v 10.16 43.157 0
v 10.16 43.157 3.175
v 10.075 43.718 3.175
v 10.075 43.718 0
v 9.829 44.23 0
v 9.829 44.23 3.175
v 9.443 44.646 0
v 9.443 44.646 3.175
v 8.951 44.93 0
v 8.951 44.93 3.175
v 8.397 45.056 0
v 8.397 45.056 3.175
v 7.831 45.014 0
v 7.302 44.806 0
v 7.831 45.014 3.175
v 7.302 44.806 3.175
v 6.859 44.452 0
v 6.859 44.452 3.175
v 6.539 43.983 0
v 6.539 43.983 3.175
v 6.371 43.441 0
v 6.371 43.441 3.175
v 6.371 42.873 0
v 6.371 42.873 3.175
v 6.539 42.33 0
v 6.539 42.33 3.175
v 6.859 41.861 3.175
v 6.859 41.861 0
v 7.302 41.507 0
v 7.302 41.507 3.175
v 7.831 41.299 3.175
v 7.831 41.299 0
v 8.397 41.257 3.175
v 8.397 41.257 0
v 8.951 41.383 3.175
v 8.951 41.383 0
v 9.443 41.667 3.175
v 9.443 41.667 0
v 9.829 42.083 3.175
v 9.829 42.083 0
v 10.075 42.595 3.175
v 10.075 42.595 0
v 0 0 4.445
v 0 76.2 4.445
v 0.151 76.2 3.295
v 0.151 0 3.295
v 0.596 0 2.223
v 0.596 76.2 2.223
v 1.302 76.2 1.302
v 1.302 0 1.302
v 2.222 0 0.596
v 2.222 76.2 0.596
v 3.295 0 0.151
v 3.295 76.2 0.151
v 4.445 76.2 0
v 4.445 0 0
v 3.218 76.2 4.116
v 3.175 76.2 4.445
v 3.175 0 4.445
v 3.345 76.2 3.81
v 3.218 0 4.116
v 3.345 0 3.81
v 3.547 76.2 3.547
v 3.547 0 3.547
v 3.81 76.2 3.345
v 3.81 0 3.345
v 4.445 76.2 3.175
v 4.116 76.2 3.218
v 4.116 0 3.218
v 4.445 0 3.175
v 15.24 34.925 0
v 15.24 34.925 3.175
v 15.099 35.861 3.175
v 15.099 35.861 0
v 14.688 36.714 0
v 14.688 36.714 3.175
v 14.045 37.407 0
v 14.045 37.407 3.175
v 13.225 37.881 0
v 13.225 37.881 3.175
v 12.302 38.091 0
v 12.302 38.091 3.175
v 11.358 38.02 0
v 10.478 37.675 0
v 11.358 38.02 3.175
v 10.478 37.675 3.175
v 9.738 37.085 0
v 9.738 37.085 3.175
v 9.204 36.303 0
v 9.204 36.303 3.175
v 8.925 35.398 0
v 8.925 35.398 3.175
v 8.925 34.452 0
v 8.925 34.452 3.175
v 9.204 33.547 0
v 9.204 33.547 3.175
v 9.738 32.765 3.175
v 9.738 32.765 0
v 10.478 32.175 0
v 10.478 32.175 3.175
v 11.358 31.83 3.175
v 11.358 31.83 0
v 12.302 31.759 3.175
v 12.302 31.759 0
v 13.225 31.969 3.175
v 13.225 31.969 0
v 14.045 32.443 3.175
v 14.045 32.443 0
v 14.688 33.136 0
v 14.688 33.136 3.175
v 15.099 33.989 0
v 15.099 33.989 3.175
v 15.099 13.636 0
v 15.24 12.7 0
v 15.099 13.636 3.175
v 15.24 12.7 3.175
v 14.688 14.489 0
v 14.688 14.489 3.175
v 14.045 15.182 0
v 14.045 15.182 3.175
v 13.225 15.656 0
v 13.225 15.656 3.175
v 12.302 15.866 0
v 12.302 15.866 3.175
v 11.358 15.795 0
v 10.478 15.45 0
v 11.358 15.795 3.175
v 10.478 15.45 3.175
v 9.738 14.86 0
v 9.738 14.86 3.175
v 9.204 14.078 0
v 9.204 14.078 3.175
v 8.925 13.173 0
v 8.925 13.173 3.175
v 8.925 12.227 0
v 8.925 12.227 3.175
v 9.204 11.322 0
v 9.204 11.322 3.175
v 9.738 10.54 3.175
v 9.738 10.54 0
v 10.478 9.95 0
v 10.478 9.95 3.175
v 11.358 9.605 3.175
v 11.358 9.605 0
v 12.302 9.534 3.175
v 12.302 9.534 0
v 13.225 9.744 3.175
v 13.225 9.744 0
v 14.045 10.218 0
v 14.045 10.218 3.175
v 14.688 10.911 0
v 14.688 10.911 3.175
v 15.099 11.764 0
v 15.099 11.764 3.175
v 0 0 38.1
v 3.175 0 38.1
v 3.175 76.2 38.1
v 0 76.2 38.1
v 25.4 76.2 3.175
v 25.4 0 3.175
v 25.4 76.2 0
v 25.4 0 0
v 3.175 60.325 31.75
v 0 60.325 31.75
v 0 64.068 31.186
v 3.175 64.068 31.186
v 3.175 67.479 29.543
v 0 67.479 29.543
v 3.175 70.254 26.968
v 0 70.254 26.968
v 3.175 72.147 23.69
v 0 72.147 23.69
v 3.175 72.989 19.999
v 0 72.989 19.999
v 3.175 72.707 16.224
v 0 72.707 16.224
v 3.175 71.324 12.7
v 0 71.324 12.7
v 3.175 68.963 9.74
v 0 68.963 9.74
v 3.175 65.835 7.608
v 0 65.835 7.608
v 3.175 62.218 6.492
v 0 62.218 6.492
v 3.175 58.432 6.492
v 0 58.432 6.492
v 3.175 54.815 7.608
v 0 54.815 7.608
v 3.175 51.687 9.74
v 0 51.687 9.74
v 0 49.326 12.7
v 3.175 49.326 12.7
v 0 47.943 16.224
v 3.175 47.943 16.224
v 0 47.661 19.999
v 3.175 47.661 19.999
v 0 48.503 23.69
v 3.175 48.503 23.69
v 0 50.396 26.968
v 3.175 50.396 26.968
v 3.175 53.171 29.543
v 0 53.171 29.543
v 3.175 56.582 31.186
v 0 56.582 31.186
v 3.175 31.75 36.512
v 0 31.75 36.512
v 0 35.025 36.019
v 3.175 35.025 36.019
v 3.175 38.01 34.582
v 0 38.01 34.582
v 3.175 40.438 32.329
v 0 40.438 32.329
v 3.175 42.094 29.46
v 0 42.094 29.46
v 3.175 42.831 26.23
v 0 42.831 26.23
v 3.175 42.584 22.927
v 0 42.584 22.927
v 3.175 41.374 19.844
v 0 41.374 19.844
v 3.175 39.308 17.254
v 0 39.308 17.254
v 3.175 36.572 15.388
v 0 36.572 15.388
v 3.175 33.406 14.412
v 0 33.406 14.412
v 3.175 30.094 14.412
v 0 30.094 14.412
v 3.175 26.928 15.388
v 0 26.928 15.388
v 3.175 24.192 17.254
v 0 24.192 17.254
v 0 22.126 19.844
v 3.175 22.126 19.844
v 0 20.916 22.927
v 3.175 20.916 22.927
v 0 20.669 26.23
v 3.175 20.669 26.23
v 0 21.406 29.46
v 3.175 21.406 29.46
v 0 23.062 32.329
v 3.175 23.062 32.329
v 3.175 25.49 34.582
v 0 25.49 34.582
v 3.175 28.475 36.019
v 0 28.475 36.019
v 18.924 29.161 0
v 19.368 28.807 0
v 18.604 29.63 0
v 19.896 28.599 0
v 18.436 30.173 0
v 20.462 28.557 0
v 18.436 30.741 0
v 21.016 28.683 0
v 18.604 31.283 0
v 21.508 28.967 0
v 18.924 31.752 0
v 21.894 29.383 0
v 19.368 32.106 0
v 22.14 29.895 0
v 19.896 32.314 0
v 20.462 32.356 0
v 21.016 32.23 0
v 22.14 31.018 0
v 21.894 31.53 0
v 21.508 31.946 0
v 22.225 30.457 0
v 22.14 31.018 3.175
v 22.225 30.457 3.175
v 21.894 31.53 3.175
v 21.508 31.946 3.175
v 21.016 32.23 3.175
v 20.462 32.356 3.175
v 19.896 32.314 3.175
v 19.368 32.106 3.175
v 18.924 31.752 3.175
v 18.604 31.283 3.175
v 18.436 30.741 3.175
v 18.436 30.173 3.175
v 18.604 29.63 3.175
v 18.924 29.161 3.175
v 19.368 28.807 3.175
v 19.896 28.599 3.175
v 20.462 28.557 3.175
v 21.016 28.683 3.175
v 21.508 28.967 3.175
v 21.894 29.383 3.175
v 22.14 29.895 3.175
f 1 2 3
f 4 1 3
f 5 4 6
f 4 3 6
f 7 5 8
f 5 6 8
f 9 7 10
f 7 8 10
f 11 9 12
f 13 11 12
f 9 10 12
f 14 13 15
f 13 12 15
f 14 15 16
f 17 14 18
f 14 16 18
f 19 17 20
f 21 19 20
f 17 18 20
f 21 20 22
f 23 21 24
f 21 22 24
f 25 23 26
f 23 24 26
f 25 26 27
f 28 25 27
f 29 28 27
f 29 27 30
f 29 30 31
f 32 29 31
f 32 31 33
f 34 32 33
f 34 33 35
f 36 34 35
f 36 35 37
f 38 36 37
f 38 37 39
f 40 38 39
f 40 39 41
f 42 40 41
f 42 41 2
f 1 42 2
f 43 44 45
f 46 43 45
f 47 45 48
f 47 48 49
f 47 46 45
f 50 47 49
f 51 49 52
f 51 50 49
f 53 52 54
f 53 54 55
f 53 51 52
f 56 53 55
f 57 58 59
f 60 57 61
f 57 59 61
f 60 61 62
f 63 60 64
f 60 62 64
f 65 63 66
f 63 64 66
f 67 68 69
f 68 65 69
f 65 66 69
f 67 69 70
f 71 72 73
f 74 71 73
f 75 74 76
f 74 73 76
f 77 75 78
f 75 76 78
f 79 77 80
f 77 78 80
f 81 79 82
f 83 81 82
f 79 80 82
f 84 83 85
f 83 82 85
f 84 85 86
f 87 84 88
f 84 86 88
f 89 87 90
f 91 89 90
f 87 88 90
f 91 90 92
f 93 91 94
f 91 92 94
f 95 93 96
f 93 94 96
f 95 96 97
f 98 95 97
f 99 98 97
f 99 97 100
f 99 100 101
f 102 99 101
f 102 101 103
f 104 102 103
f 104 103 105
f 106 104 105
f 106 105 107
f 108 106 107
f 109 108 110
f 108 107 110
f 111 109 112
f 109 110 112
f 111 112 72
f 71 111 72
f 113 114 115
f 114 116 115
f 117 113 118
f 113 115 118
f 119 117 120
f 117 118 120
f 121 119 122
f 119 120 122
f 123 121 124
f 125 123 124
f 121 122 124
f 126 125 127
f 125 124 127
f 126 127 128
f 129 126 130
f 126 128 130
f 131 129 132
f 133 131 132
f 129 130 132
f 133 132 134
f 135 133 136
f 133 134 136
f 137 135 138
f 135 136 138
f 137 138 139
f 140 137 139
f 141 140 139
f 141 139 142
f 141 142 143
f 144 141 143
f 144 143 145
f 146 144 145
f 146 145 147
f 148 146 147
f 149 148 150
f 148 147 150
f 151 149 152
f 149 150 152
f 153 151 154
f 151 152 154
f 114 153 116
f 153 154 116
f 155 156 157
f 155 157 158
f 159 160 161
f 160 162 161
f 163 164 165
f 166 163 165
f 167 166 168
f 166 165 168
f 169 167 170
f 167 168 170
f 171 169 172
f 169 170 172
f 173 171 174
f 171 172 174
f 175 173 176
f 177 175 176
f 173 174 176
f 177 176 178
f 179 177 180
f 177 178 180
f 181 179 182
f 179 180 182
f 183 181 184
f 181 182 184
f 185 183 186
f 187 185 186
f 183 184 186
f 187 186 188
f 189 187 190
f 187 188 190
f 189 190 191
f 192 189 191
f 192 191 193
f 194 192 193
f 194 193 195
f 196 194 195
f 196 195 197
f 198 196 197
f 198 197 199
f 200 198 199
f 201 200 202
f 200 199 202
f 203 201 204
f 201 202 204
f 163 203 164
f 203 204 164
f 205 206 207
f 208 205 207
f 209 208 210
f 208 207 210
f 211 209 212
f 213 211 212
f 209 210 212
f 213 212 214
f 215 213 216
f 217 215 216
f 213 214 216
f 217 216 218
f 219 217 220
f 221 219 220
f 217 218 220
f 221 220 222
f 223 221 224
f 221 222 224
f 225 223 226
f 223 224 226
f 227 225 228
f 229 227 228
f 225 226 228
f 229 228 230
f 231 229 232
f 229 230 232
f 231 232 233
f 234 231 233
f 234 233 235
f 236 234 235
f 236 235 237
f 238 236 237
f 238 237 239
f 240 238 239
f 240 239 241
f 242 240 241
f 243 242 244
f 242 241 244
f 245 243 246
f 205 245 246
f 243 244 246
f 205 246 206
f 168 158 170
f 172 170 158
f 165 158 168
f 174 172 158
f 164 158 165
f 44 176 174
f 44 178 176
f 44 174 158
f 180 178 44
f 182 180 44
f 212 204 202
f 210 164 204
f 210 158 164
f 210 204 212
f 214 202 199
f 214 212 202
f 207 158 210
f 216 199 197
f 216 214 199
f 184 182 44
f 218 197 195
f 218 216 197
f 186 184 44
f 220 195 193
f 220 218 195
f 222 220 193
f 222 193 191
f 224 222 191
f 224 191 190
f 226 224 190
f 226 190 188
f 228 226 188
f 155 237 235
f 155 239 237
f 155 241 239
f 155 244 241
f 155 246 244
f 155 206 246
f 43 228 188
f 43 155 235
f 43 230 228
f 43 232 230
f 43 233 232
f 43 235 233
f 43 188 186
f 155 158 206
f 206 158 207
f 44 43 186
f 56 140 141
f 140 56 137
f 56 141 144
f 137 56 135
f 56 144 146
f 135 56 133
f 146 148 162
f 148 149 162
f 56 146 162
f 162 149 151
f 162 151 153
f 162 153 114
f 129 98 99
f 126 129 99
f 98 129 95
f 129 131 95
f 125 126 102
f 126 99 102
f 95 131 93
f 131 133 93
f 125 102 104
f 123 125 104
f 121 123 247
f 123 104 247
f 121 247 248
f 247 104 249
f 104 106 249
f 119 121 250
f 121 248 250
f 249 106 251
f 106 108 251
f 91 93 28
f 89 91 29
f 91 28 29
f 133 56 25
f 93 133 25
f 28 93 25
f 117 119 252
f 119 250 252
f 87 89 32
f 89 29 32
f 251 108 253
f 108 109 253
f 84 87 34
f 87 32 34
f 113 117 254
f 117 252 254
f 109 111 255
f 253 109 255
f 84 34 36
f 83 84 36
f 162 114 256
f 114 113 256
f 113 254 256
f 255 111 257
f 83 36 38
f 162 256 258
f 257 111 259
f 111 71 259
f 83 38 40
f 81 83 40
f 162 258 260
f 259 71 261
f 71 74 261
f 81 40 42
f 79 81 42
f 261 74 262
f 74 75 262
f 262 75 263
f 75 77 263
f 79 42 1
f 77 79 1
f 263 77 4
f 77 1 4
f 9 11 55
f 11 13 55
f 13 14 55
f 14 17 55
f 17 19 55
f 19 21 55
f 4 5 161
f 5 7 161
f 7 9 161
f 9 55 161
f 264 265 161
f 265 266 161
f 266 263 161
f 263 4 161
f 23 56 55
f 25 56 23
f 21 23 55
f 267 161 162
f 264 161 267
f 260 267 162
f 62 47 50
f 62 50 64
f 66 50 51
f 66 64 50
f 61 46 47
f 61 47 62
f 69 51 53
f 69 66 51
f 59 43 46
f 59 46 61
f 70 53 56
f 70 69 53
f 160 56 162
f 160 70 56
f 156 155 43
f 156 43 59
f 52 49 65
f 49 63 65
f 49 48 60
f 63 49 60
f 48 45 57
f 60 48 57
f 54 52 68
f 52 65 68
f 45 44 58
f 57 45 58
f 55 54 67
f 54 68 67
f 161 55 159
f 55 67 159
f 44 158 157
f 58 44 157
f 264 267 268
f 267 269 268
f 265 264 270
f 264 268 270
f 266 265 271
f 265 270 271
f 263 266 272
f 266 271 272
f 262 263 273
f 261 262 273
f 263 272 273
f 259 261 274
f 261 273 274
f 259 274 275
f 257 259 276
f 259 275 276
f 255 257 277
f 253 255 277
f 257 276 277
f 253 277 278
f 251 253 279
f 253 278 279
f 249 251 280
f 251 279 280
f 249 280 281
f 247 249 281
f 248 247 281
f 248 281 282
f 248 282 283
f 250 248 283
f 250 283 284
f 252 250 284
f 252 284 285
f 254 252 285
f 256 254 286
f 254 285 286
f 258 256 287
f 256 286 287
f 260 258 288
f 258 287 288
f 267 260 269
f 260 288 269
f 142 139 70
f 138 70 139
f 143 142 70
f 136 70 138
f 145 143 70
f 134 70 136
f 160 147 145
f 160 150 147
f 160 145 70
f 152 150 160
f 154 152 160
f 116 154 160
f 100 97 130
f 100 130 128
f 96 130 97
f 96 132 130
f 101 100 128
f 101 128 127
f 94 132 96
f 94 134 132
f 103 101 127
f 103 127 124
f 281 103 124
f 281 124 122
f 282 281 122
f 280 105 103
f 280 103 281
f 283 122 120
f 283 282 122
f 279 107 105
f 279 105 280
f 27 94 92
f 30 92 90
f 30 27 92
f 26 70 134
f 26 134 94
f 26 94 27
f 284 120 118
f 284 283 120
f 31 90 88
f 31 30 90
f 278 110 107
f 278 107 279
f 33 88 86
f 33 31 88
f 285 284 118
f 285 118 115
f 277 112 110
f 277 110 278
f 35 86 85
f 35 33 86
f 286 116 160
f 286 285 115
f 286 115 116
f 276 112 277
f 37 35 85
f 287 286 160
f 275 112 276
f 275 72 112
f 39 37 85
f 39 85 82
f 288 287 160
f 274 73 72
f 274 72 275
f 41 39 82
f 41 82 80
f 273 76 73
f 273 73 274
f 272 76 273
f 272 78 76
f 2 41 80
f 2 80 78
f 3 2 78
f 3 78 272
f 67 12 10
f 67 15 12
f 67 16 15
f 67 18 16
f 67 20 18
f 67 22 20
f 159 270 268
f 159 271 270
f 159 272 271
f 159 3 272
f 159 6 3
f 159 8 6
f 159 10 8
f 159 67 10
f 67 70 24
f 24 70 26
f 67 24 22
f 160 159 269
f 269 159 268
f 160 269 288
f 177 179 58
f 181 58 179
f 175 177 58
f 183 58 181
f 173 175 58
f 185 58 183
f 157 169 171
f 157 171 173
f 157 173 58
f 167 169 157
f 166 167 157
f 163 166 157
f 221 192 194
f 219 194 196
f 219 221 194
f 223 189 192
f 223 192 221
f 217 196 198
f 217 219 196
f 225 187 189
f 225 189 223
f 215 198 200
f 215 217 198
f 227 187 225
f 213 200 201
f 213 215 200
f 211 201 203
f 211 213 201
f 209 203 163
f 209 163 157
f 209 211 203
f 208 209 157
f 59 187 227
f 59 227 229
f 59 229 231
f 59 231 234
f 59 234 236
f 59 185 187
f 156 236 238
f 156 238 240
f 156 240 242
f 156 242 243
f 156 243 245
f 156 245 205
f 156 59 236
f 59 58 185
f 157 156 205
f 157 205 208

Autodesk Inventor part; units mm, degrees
ref_plane "YZ Plane" through (0, 0, 0) normal (1, 0, 0) x (0, 1, 0)
ref_plane "XZ Plane" through (0, 0, 0) normal (0, 1, 0) x (-1, 0, 0)
ref_plane "XY Plane" through (0, 0, 0) normal (0, 0, 1) x (1, 0, 0)
sketch "Sketch1" plane through (0, 0, 0) normal (0, 0, 1) x (1, 0, 0)
  line L0 (0, 0) -> (25.4, 0)
  line L1 (25.4, 0) -> (25.4, 76.2)
  line L2 (25.4, 76.2) -> (0, 76.2)
  line L3 (0, 76.2) -> (0, 0)
  dimension "d0" = 25.4
  dimension "d1" = 76.2
extrude "Plate1" add sketch "Sketch1" along normal blind 3.175
sketch "Sketch2" plane through (3.175, 0, 0) normal (-1, 0, 0) x (0, -1, 0)
  line L0 (-76.2, 0) -> (0, 0)
  line L1 (0, 0) -> (0, 38.1)
  line L2 (0, 38.1) -> (-76.2, 38.1)
  line L3 (-76.2, 38.1) -> (-76.2, 0)
edge flange "Flange1" height 38.1 angle 90 thickness 3.175 bend radius 1.27 thickness toward (-1, 0, 0) relief tear relief width 3.175 relief depth 1.5875 edges at (0, 38.1, 3.175) wall of the first edge with corners at (3.175, 76.2, 0) (3.175, 0, 0) (3.175, 0, 38.1) (3.175, 76.2, 38.1)
bend "Bend1"
corner "Corner1"
sketch "Sketch3" plane through (0, 0, 38.1) normal (-1, 0, 0) x (0, 0, 1)
  line L0 (0, 0) -> (-33.655, 0) projected
  line L1 (0, 76.2) -> (0, 0) projected
  line L2 (-33.655, 76.2) -> (0, 76.2) projected
  circle A0 centre (-19.05, 60.325) radius 12.7
  circle A1 centre (-12.7, 31.75) radius 11.1125
  point P0 (-38.1, 0)
  dimension "d13" = 25.4
  dimension "d14" = 22.225
  dimension "d15" = 15.875
  dimension "d16" = 19.05
  dimension "d17" = 12.7
  dimension "d18" = 31.75
extrude "Cut1" cut sketch "Sketch3" against normal blind 3.175
sketch "Sketch4" plane through (0, 0, 3.175) normal (0, 0, 1) x (1, 0, 0)
  line L0 (4.445, 76.2) -> (4.445, 0) projected
  line L1 (25.4, 76.2) -> (25.4, 0) projected
  circle A0 centre (-69.6884, -88.0779) radius 3.3782 construction
  circle A1 centre (-79.6289, 46.8501) radius 3.3782 construction
  circle A2 centre (-113.1559, 49.7834) radius 3.3782 construction
  circle A3 centre (-43.9071, -66.4449) radius 3.3782 construction
  line L2 (-118.5182, 63.001) -> (-315.8997, 80.2697) construction
  arc A4 (-315.8997, 80.2697) -> (-318.1134, 54.9663) centre (74.9912, 33.3226) ccw construction
  line L3 (-318.1134, 54.9663) -> (38.1, 23.8017) construction
  arc A5 (38.1, 23.8017) -> (42.1314, 14.0393) centre (74.9912, 33.3226) ccw construction
  line L4 (42.1314, 14.0393) -> (-230.643, -214.8455) construction
  arc A6 (-230.643, -214.8455) -> (-226.6005, -219.7429) centre (74.9912, 33.3226) ccw construction
  line L5 (-226.6005, -219.7429) -> (-222.5188, -224.6072) construction
  line L6 (-222.5188, -224.6072) -> (50.2948, 4.3106) construction
  arc A7 (50.2948, 4.3106) -> (55.7079, 66.1824) centre (74.9912, 33.3226) ccw construction
  line L7 (55.7079, 66.1824) -> (15.7878, 113.7573) construction
  arc A8 (-3.434, 116.9073) -> (15.7878, 113.7573) centre (29.7432, 259.139) ccw construction
  line L8 (-3.434, 116.9073) -> (-110.1078, 141.7901) construction
  line L9 (-110.1078, 141.7901) -> (-116.0889, 251.1642) construction
  arc A9 (-115.8532, 270.641) -> (-116.0889, 251.1642) centre (29.7432, 259.139) ccw construction
  line L10 (-115.8532, 270.641) -> (-173.2099, 338.996) construction
  line L11 (-173.2099, 338.996) -> (-178.0743, 334.9143) construction
  arc A10 (-178.0743, 334.9143) -> (-182.9057, 330.7934) centre (74.9912, 33.3226) ccw construction
  line L12 (-182.9057, 330.7934) -> (-129.6946, 267.3788) construction
  line L13 (-129.6946, 267.3788) -> (-118.5182, 63.001) construction
  circle A11 centre (-173.9926, 330.0499) radius 3.3782 construction
  circle A12 centre (-141.339, 291.1349) radius 3.3782 construction
  line L14 (-105.7381, 61.8829) -> (-109.3854, 128.5807) construction
  line L15 (-109.3854, 128.5807) -> (10.1717, 100.6927) construction
  line L16 (10.1717, 100.6927) -> (45.9792, 58.019) construction
  arc A13 (45.9792, 58.019) -> (40.3138, 49.105) centre (74.9912, 33.3226) ccw construction
  line L17 (40.3138, 49.105) -> (-105.7381, 61.8829) construction
  circle A14 centre (74.9912, 33.3226) radius 9.5 construction
  circle A15 centre (-310.4012, 72.216) radius 3.3782 construction
  circle A16 centre (-311.3, 61.9429) radius 3.3782 construction
  circle A17 centre (-259.7945, 67.7885) radius 3.3782 construction
  circle A18 centre (-260.6933, 57.5153) radius 3.3782 construction
  circle A19 centre (-221.7361, -215.6611) radius 3.3782 construction
  circle A20 centre (-182.821, -183.0075) radius 3.3782 construction
  circle A21 centre (-32.0252, -56.4748) radius 3.3782 construction
  circle A22 centre (-139.0416, -146.2722) radius 3.3782 construction
  circle A23 centre (-63.4799, 51.8115) radius 3.3782 construction
  circle A24 centre (-64.5868, 39.1599) radius 3.3782 construction
  circle A25 centre (-202.7203, 63.9935) radius 3.3782 construction
  circle A26 centre (-203.8271, 51.3418) radius 3.3782 construction
  circle A27 centre (20.32, 30.4566) radius 1.905
  circle A28 centre (8.255, 43.1566) radius 1.905
  line L18 (25.4, 0) -> (4.445, 0) projected
  line L19 (4.445, 76.2) -> (25.4, 76.2) projected
  line L20 (12.065, 76.2) -> (12.065, 0) construction
  circle A29 centre (12.065, 12.7) radius 3.175
  circle A30 centre (12.065, 34.925) radius 3.175
  point P0 (0, 0)
  dimension "d21" = 3.81
  dimension "d22" = 5.08
  dimension "d23" = 5.08
  dimension "d24" = 12.7
  dimension "d25" = 3.81
  dimension "d28" = 7.62
  dimension "d29" = 6.35
  dimension "d30" = 12.7
  dimension "d31" = 22.225
extrude "Cut2" cut sketch "Sketch4" against normal blind 3.175 contours A27 | A28 | A29 | A30
equation "\"d19\" = Thickness"
equation "\"d26\" = Thickness"
equation "\"d3\" = BendReliefWidth"
equation "\"d4\" = BendReliefDepth"
equation "\"d5\" = MinimumRemnant"
equation "\"d6\" = BendRadius"
equation "\"d10\" = CornerReliefSize"
equation "\"d11\" = GapSize"
equation "\"d12\" = JacobiRadiusSize"
equation "\"BendRadius\" = Thickness"
equation "\"BendReliefWidth\" = Thickness"
equation "\"BendReliefDepth\" = 0.5 * Thickness"
equation "\"CornerReliefSize\" = 4 * Thickness"
equation "\"MinimumRemnant\" = 2 * Thickness"
equation "\"TransitionRadius\" = BendRadius"
equation "\"JacobiRadiusSize\" = BendRadius"
equation "\"GapSize\" = Thickness"
equation "\"d2\" = BendRadius"
equation "\"Thickness\" = 3.175"
properties part number "Shooter Magnetic Sensor Mount Bracket" material "Aluminum 6061"
